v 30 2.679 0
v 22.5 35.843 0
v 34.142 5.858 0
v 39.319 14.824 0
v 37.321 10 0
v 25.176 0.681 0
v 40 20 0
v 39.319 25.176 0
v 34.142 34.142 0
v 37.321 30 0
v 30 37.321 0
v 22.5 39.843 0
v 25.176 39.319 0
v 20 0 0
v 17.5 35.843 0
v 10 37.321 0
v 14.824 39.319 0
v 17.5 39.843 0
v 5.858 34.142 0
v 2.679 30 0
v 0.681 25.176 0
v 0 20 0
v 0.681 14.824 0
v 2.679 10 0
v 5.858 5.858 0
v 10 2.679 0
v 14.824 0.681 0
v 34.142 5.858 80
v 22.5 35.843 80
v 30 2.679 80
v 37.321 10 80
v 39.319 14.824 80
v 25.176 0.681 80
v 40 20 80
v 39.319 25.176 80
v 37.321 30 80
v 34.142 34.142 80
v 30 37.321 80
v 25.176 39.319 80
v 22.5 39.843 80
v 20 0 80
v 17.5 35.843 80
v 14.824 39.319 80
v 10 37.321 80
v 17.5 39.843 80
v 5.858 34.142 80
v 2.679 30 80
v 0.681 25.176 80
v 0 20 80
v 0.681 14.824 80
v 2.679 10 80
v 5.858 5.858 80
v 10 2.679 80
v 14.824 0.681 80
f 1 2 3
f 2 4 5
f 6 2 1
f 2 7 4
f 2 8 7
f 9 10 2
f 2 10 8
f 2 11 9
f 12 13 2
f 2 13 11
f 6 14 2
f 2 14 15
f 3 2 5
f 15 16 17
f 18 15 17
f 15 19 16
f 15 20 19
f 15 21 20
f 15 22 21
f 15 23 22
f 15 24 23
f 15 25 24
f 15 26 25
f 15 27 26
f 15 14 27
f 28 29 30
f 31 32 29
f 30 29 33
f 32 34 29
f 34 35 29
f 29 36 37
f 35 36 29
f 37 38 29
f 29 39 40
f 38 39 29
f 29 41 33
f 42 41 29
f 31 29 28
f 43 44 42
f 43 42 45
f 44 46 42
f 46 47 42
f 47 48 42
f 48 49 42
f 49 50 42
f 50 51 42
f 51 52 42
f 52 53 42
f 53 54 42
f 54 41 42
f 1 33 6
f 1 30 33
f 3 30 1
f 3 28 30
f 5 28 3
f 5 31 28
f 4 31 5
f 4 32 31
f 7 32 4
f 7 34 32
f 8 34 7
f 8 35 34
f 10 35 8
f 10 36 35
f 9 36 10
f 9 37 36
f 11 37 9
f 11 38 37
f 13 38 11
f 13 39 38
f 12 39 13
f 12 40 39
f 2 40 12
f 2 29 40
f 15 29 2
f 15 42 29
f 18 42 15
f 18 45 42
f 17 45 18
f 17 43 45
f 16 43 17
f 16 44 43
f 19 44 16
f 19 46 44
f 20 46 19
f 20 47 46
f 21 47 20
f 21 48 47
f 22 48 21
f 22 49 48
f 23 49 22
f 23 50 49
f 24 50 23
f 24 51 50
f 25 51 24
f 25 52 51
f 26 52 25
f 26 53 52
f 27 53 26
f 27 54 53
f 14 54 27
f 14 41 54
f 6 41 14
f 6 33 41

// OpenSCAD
$fn = 32;

// ----------------------------------------------------------------------
// Keyway shaft: d40 shaft, key 5 x 4 mm
// ----------------------------------------------------------------------

// --- parameters (mm) ---
shaft_r = 20;             // shaft radius
key_w = 5;                // keyway width
key_d = 4;                // keyway depth below the surface line
plate_t = 80;             // shaft length, Z (extrusion height)
fit_tol = 0.05;           // declared fit tolerance (prompt contract)
free_tol = 0.2;           // declared free tolerance (prompt contract)

shaft_d = 2 * shaft_r;  // shaft diameter
circle_step = 15;  // polygon sampling step, degrees

profile = [[14.824, 39.319], [10, 37.321], [5.858, 34.142], [2.679, 30], [0.681, 25.176], [0, 20], [0.681, 14.824], [2.679, 10], [5.858, 5.858], [10, 2.679], [14.824, 0.681], [20, 0], [25.176, 0.681], [30, 2.679], [34.142, 5.858], [37.321, 10], [39.319, 14.824], [40, 20], [39.319, 25.176], [37.321, 30], [34.142, 34.142], [30, 37.321], [25.176, 39.319], [22.5, 39.843], [22.5, 35.843], [17.5, 35.843], [17.5, 39.843]];  // primary outline, 27 points, counter clockwise

// --- the one profile operation ---
linear_extrude(height = plate_t) polygon(points = profile);
